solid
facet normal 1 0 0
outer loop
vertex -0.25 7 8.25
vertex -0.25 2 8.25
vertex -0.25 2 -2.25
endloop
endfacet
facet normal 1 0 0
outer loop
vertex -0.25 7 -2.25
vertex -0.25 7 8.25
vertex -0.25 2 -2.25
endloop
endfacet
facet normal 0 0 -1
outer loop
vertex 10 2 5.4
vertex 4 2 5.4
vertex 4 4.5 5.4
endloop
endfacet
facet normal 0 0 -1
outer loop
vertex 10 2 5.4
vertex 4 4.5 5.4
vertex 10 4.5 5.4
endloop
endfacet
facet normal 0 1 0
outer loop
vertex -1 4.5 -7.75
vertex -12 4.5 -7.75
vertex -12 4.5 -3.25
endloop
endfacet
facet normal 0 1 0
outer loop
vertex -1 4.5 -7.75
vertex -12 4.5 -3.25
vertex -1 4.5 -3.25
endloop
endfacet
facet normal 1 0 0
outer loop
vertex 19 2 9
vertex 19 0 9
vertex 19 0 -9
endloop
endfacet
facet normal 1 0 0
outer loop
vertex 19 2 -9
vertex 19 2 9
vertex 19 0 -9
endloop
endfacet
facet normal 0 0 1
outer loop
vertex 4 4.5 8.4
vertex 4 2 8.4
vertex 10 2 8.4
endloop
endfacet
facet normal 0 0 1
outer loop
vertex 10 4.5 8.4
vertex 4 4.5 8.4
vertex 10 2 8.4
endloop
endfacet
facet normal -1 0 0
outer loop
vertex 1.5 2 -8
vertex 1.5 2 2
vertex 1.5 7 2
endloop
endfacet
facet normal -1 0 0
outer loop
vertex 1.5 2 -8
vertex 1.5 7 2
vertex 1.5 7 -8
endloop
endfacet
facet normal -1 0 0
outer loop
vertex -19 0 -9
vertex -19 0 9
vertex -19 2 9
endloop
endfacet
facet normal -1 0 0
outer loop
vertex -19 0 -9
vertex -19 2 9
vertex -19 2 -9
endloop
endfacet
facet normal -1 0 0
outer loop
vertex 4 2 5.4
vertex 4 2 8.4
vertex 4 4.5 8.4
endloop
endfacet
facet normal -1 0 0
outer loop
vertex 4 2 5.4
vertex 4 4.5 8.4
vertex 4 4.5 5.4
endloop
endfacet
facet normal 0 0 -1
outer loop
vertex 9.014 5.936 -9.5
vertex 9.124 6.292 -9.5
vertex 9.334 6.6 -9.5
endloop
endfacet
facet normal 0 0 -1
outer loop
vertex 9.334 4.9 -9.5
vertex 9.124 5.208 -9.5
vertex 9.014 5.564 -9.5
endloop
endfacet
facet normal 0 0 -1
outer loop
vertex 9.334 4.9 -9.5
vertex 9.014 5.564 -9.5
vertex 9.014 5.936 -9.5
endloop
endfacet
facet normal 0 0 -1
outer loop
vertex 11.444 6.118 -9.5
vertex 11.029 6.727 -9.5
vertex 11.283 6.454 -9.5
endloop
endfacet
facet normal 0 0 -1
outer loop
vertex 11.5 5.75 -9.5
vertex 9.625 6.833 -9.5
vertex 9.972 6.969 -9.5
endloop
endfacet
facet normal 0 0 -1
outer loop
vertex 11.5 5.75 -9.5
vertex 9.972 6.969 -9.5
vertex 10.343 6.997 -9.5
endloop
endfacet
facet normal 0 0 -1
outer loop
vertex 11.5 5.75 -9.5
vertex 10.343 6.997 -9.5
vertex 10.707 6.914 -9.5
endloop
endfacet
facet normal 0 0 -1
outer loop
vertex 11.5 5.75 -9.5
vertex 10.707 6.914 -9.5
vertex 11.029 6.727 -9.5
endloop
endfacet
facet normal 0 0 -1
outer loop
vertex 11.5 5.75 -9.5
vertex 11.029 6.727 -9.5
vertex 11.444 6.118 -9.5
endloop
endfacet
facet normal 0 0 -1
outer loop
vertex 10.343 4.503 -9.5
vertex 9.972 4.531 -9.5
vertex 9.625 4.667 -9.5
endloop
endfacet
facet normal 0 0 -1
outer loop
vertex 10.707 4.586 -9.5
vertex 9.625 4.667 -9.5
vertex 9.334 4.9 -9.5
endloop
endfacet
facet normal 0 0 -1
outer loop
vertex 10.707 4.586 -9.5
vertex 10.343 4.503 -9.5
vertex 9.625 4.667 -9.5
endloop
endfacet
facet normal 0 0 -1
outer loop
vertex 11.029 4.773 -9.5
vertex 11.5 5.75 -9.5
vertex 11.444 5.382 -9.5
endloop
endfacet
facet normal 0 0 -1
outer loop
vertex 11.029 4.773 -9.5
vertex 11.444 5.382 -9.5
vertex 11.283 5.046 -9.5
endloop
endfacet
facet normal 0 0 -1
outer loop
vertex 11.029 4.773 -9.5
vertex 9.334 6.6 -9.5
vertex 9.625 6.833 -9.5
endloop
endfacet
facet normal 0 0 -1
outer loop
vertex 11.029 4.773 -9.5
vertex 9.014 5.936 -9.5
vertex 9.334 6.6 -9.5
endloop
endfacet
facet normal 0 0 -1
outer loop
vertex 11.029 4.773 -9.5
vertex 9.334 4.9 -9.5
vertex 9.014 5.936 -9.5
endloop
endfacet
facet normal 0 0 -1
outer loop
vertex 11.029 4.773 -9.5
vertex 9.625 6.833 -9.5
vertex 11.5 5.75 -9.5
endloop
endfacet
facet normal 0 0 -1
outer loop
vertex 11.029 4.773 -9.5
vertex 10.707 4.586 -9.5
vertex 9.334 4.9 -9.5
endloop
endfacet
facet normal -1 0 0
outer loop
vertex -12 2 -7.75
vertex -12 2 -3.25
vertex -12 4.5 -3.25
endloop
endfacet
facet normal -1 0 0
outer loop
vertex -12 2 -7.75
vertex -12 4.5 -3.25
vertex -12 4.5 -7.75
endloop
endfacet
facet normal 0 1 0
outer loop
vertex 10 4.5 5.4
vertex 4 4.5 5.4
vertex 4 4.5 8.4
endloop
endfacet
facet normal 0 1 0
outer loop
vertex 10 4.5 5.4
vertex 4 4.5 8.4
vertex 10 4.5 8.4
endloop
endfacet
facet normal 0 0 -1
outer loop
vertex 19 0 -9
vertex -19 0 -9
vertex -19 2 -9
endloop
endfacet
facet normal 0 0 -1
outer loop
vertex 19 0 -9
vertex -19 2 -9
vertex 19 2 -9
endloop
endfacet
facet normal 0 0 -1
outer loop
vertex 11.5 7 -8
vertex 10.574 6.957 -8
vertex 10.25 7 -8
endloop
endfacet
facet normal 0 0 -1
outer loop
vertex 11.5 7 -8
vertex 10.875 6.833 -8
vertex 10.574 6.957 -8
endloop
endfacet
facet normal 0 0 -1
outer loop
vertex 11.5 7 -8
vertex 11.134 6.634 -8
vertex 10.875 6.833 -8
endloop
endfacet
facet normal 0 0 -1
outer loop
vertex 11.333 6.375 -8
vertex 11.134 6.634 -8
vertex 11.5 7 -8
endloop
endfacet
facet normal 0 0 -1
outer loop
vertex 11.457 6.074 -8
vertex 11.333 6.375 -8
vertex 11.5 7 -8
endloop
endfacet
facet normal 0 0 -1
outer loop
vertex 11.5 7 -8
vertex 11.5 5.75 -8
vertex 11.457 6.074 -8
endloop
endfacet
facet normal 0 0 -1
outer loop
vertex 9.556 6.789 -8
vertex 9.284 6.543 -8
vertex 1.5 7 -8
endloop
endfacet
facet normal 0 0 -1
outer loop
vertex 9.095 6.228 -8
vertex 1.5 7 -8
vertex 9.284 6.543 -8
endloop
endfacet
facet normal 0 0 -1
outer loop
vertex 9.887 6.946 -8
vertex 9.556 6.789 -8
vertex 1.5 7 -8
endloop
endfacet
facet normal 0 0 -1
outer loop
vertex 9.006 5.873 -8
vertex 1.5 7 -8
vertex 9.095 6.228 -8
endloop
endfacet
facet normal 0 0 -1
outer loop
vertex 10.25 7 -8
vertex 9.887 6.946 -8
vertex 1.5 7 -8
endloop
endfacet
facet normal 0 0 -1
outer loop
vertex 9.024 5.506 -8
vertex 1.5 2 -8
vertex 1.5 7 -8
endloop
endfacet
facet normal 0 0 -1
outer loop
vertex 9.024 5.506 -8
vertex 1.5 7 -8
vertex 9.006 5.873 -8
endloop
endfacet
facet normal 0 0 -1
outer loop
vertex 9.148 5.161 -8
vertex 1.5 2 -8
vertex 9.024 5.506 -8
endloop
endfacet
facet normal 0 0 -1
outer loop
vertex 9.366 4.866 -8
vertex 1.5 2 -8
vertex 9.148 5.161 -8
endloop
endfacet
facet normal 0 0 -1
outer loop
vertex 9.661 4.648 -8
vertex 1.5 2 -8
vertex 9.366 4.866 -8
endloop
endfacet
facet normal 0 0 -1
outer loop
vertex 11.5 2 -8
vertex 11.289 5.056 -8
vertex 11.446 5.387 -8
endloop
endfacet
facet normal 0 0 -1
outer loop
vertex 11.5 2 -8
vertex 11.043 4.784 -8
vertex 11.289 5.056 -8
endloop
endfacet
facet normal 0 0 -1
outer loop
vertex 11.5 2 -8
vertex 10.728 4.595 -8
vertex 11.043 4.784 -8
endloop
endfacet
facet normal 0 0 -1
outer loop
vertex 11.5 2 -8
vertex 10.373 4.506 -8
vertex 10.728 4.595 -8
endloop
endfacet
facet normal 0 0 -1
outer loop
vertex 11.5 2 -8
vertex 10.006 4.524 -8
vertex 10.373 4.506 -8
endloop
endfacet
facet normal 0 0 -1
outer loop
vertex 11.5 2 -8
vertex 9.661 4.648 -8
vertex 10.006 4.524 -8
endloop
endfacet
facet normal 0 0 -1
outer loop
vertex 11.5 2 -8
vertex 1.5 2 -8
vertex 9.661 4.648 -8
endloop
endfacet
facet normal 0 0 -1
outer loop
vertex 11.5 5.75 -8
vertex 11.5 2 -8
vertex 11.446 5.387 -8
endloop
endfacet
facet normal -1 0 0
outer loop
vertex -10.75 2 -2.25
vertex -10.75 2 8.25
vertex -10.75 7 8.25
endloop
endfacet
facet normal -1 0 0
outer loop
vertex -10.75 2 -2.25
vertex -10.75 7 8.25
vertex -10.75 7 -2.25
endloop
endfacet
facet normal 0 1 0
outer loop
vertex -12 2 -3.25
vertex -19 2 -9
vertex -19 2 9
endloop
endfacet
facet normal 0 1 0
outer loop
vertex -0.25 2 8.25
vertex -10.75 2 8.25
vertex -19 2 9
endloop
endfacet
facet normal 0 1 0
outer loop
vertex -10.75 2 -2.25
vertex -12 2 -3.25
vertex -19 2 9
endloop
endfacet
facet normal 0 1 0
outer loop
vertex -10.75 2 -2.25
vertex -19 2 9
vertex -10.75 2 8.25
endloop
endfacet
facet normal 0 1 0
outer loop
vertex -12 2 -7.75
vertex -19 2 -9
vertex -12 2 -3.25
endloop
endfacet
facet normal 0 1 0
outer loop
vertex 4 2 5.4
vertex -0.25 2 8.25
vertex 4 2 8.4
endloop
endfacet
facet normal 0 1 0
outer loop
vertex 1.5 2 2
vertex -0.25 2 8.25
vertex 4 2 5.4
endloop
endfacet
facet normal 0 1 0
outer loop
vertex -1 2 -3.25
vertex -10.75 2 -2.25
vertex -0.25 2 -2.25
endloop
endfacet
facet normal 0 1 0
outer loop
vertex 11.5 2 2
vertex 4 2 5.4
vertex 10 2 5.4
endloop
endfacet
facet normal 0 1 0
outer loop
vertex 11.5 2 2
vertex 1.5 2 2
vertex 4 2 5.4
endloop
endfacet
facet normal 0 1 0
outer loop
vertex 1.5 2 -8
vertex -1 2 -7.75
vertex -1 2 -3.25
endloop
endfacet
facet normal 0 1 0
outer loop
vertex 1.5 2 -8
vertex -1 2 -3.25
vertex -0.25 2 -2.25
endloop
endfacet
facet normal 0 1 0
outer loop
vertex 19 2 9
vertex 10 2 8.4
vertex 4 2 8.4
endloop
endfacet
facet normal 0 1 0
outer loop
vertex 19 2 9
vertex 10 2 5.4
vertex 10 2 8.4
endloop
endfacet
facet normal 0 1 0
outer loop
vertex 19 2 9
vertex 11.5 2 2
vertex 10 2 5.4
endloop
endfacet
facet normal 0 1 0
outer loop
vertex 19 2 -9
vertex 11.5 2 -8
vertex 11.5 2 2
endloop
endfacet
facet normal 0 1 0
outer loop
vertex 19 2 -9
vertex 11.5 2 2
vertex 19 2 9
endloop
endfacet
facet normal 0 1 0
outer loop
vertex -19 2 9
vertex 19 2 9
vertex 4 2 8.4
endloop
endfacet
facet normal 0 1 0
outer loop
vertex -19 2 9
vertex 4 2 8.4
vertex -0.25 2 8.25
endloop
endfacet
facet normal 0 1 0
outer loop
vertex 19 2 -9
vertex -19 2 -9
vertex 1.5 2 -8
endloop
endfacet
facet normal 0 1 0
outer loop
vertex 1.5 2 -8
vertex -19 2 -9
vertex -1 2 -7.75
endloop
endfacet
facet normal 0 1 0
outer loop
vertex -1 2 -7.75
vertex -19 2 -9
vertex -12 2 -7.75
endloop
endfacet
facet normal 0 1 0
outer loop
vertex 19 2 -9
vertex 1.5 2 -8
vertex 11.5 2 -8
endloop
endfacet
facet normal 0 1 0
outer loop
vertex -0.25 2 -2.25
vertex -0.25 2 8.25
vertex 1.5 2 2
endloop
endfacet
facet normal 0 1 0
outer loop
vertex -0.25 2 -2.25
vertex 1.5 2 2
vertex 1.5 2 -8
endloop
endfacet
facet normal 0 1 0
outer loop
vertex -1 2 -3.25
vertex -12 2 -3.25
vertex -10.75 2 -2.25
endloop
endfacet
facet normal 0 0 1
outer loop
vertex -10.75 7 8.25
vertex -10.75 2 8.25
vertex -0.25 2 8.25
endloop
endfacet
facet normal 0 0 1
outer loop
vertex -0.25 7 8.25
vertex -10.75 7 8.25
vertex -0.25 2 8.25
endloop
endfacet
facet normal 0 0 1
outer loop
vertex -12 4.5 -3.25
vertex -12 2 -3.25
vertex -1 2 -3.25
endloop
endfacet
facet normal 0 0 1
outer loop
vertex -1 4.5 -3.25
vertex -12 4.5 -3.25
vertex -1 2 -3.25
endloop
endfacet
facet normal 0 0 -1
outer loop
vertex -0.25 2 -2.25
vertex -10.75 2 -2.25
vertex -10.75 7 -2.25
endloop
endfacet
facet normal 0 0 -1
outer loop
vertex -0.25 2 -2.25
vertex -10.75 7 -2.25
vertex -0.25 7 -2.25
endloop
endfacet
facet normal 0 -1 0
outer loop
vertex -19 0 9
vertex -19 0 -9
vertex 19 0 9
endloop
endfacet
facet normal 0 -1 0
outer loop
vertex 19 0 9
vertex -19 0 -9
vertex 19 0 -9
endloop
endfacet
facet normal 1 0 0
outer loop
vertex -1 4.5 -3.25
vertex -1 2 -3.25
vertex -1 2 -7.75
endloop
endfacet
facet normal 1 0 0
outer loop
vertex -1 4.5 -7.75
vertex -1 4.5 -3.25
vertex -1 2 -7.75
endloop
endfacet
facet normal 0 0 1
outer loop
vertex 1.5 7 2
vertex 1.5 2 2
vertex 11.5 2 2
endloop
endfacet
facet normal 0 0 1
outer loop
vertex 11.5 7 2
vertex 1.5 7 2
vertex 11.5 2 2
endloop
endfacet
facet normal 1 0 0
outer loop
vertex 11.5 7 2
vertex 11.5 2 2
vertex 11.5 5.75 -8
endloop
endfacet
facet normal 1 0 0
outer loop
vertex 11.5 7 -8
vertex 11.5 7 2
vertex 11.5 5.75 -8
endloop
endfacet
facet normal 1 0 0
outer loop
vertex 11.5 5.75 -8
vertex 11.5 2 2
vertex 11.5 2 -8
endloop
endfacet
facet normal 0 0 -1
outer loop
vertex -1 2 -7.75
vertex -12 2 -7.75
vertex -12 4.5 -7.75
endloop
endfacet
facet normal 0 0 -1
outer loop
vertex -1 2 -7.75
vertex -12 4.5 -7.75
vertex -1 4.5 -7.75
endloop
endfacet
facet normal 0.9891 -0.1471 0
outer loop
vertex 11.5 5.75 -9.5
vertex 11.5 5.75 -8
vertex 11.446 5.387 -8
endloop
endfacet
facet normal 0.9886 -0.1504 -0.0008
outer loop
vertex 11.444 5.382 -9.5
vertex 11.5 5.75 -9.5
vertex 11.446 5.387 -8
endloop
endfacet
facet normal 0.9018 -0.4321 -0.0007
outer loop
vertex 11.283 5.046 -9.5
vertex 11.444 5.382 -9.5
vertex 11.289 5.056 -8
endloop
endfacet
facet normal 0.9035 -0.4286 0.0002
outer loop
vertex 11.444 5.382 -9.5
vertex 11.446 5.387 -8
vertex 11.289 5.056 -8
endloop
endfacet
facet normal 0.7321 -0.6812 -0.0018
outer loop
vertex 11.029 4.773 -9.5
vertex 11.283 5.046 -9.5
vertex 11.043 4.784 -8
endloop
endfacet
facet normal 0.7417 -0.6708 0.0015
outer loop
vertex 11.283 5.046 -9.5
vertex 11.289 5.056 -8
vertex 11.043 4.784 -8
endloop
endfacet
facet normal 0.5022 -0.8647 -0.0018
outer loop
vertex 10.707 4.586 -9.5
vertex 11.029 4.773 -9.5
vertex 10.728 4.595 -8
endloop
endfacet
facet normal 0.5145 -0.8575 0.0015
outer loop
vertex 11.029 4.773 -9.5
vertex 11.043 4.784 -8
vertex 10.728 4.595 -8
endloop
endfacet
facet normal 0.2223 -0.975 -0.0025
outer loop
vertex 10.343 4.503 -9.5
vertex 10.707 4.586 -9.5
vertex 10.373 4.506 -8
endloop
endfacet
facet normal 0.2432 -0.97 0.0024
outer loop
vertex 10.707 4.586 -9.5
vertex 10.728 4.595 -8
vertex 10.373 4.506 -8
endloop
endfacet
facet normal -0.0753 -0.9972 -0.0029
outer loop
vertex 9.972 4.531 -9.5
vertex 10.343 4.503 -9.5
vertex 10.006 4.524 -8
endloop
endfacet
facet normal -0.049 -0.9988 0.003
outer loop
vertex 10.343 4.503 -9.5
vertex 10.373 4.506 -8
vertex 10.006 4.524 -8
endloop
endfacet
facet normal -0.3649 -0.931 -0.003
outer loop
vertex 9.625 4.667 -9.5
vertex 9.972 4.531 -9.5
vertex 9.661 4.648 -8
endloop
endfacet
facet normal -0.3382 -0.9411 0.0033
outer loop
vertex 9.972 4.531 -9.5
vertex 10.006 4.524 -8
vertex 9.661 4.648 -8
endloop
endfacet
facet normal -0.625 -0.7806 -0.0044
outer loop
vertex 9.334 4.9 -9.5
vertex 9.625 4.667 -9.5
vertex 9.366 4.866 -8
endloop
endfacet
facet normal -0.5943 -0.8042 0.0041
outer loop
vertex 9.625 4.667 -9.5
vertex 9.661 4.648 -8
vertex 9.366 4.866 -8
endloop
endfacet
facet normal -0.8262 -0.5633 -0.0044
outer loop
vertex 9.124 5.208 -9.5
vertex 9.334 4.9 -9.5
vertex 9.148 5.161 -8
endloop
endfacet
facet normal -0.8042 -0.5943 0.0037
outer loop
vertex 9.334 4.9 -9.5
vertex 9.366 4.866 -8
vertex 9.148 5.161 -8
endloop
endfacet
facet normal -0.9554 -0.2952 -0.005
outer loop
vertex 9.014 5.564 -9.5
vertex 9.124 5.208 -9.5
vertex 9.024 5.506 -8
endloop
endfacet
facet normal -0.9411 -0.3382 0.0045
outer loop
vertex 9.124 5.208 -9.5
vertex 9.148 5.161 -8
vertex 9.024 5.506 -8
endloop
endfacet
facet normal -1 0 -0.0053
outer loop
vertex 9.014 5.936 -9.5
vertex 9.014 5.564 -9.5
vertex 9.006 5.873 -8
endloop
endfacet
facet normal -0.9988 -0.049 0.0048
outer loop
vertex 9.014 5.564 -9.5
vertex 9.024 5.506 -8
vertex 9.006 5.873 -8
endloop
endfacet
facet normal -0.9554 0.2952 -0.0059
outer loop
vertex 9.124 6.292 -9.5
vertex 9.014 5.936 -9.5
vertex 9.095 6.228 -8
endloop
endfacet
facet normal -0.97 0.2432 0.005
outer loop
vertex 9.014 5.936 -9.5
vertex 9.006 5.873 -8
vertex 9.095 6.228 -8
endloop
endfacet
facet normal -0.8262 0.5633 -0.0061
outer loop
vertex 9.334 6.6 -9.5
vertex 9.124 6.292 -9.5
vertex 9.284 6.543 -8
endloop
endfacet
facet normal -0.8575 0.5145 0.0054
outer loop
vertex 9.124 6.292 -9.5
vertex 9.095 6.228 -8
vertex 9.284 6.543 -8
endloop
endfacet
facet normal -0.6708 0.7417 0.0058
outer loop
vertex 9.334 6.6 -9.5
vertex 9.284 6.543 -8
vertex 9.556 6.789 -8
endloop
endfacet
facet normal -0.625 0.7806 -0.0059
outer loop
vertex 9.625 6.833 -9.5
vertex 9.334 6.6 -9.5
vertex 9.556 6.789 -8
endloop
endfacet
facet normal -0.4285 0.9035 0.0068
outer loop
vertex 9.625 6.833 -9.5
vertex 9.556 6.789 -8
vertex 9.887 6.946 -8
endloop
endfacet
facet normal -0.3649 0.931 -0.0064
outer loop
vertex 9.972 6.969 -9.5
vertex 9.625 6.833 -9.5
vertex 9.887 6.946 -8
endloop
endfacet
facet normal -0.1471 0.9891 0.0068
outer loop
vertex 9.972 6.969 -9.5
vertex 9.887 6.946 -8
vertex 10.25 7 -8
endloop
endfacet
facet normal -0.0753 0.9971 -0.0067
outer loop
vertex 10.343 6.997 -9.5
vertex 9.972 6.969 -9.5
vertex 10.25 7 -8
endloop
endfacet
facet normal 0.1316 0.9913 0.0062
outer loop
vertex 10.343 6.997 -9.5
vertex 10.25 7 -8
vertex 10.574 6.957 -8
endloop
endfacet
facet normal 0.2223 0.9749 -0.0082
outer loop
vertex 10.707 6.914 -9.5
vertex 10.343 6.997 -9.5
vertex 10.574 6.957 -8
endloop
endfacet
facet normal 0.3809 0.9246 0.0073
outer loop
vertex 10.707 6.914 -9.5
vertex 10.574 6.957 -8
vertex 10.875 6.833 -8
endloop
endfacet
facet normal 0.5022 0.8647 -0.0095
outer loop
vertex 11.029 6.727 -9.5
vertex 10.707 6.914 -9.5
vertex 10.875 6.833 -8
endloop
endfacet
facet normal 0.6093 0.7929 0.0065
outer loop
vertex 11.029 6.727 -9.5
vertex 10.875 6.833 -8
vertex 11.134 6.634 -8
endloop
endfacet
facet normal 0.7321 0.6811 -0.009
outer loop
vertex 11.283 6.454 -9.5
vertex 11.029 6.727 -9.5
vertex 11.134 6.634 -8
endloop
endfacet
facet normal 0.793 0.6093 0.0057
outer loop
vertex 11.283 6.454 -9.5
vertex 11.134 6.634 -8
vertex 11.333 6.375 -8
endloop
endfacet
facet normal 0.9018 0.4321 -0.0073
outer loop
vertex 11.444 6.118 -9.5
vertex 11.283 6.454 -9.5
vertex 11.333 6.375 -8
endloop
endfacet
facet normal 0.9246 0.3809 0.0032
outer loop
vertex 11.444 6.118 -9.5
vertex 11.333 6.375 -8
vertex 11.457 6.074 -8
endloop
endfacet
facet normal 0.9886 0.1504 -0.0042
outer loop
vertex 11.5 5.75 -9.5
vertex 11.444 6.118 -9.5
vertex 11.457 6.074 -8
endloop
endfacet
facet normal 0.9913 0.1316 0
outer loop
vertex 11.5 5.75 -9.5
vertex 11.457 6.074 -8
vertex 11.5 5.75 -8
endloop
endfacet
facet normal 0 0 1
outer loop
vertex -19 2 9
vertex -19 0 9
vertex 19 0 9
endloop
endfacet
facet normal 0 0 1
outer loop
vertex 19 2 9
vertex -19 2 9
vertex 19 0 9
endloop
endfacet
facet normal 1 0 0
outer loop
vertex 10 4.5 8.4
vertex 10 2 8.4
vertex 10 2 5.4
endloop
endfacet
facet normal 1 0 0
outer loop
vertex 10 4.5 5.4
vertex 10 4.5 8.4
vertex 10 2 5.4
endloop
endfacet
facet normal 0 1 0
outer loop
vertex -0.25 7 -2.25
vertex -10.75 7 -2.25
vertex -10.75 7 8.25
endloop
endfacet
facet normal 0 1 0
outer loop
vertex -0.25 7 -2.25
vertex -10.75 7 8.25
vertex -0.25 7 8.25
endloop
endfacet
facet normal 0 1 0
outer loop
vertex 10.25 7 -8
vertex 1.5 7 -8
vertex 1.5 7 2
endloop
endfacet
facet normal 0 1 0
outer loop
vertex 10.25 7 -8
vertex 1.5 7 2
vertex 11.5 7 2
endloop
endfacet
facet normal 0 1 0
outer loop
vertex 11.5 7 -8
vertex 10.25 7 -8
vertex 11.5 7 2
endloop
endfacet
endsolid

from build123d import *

# Parameters (mm, degrees)
SKETCH1_W           = 38
SKETCH1_H           = 18
BOSS_EXTRUDE1_DEPTH = 2
SKETCH2_W           = 6
SKETCH2_H           = 3
SKETCH2_W_2         = 11
SKETCH2_H_2         = 4.5
BOSS_EXTRUDE2_DEPTH = 2.5
SKETCH3_W           = 10.5
SKETCH3_H           = 10.5
SKETCH3_W_2         = 10
SKETCH3_H_2         = 10
BOSS_EXTRUDE3_DEPTH = 5
SKETCH4_R           = 1.25
BOSS_EXTRUDE4_DEPTH = 1.5


with BuildPart() as part:
    # Sketch1 → Boss-Extrude1 (new body)
    with BuildSketch(Plane(origin=(0, 0, 0), x_dir=(1, 0, 0), z_dir=(0, 1, 0))):
        Rectangle(SKETCH1_W, SKETCH1_H)
    extrude(amount=BOSS_EXTRUDE1_DEPTH)

    # Sketch2 → Boss-Extrude2 (add)
    with BuildSketch(Plane(origin=(0, 2, 0), x_dir=(1, 0, 0), z_dir=(0, 1, 0))):
        with Locations((7, -6.9)):
            Rectangle(SKETCH2_W, SKETCH2_H)
        with Locations((-6.5, 5.5)):
            Rectangle(SKETCH2_W_2, SKETCH2_H_2)
    extrude(amount=BOSS_EXTRUDE2_DEPTH)

    # Sketch3 → Boss-Extrude3 (add)
    with BuildSketch(Plane(origin=(0, 2, 0), x_dir=(1, 0, 0), z_dir=(0, 1, 0))):
        with Locations((-5.5, -3)):
            Rectangle(SKETCH3_W, SKETCH3_H)
        with Locations((6.5, 3)):
            Rectangle(SKETCH3_W_2, SKETCH3_H_2)
    extrude(amount=BOSS_EXTRUDE3_DEPTH)

    # Sketch4 → Boss-Extrude4 (add)
    with BuildSketch(Plane(origin=(0, 0, -8), x_dir=(-1, 0, 0), z_dir=(0, 0, -1))):
        with Locations(Location((-10.25, 5.75, 0), (0, 0, 180))):
            Circle(SKETCH4_R)
    extrude(amount=BOSS_EXTRUDE4_DEPTH)


solid = part.part
